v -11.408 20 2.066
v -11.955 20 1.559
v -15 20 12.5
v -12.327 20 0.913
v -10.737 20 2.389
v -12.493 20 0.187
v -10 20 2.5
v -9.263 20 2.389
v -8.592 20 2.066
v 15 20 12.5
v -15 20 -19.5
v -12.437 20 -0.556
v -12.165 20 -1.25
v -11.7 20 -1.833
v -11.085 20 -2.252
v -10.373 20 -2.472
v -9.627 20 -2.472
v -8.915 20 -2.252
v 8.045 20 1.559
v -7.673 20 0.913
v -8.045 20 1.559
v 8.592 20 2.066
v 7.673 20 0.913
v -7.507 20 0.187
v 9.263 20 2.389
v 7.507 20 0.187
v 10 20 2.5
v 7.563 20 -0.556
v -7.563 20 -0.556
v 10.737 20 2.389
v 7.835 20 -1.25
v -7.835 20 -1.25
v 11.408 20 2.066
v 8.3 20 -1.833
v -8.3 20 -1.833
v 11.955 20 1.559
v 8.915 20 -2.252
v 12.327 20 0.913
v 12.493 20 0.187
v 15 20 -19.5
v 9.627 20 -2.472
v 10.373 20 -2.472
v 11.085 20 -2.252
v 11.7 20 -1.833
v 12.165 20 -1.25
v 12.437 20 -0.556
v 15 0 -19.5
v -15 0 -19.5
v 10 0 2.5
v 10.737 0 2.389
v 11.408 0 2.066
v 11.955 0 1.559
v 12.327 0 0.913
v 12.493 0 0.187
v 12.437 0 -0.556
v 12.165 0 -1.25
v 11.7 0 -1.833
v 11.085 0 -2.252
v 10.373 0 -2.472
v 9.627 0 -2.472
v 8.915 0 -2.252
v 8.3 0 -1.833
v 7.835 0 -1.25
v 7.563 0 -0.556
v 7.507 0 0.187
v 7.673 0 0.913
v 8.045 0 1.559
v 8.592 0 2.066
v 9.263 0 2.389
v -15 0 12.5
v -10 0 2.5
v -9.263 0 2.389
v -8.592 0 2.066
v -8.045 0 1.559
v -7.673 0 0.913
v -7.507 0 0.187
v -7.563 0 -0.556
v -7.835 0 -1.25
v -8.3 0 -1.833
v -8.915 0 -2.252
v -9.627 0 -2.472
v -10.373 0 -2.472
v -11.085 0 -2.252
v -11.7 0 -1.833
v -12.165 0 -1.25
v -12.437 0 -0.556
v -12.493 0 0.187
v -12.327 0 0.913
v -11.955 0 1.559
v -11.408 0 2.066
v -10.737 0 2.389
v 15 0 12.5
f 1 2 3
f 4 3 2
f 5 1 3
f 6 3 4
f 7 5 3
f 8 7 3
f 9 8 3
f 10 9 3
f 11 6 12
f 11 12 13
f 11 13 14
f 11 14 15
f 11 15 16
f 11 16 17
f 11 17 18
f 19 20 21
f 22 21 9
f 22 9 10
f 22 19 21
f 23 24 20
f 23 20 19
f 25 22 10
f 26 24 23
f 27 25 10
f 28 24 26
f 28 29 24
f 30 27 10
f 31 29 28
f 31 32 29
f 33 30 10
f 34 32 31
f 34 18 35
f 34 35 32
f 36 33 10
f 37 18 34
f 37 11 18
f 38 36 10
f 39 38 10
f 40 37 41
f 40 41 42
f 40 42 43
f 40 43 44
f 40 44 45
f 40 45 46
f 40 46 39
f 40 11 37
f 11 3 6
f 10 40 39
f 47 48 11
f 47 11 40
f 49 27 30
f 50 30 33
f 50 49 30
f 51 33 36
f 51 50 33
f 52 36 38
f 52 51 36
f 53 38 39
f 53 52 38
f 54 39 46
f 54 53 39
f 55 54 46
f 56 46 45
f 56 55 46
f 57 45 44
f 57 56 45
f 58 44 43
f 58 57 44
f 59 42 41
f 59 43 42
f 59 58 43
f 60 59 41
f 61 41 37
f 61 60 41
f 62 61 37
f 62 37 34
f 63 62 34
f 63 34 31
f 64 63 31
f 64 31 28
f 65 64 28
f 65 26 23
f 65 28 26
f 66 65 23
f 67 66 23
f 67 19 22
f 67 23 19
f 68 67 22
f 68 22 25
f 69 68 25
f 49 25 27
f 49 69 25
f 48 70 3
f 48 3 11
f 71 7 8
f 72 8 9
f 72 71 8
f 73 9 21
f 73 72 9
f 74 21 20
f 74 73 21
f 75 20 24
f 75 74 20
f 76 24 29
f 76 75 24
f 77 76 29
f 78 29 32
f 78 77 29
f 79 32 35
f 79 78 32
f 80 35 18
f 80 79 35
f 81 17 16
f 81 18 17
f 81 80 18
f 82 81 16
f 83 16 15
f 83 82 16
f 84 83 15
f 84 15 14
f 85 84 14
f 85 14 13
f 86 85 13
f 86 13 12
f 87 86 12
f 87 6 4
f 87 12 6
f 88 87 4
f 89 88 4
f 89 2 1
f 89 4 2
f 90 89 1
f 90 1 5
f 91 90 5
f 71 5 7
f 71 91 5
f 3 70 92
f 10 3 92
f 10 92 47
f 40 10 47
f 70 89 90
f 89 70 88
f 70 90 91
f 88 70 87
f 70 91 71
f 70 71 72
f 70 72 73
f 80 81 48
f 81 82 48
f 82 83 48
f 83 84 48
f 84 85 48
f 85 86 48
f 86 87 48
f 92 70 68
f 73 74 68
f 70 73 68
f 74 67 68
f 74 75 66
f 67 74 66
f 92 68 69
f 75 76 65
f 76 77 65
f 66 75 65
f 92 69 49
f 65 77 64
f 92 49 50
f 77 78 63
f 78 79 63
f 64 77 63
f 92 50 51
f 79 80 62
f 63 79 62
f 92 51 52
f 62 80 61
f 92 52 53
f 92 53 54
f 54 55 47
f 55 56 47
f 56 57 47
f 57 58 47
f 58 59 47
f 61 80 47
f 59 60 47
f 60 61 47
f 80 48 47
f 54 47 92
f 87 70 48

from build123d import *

# Parameters (mm, degrees)
SKETCH1_W           = 30
SKETCH1_H           = 22
SKETCH1_H_2         = 32
SKETCH1_R           = 2.5
BOSS_EXTRUDE1_DEPTH = 20


with BuildPart() as part:
    # Sketch1 → Boss-Extrude1 (new body)
    # profile 1 of 2: a face of its own
    with BuildSketch(Plane(origin=(0, 0, 0), x_dir=(1, 0, 0), z_dir=(0, 1, 0))):
        with Locations((0, 3.5)):
            Rectangle(SKETCH1_W, SKETCH1_H)
        with BuildLine():
            ThreePointArc((-7.5, -2.5), (-10, -5), (-12.5, -2.5))
            Line((-12.5, -2.5), (-12.5, 0))
            Line((-12.5, 0), (-12.5, 2.5))
            ThreePointArc((-12.5, 2.5), (-10, 5), (-7.5, 2.5))
            Line((-7.5, 2.5), (-7.5, 0))
            Line((-7.5, 0), (-7.5, -2.5))
        make_face(mode=Mode.SUBTRACT)
        with BuildLine():
            ThreePointArc((12.5, -2.5), (10, -5), (7.5, -2.5))
            Line((7.5, -2.5), (7.5, 0))
            Line((7.5, 0), (7.5, 2.5))
            ThreePointArc((7.5, 2.5), (10, 5), (12.5, 2.5))
            Line((12.5, 2.5), (12.5, 0))
            Line((12.5, 0), (12.5, -2.5))
        make_face(mode=Mode.SUBTRACT)
    # profile 2 of 2: a face of its own
    with BuildSketch(Plane(origin=(0, 0, 0), x_dir=(1, 0, 0), z_dir=(0, 1, 0))):
        with Locations((0, 3.5)):
            Rectangle(SKETCH1_W, SKETCH1_H_2)
        with Locations(Location((10, 0, 0), (0, 0, 270))):
            Circle(SKETCH1_R, mode=Mode.SUBTRACT)
        with Locations(Location((-10, 0, 0), (0, 0, 270))):
            Circle(SKETCH1_R, mode=Mode.SUBTRACT)
    extrude(amount=BOSS_EXTRUDE1_DEPTH)


solid = part.part
